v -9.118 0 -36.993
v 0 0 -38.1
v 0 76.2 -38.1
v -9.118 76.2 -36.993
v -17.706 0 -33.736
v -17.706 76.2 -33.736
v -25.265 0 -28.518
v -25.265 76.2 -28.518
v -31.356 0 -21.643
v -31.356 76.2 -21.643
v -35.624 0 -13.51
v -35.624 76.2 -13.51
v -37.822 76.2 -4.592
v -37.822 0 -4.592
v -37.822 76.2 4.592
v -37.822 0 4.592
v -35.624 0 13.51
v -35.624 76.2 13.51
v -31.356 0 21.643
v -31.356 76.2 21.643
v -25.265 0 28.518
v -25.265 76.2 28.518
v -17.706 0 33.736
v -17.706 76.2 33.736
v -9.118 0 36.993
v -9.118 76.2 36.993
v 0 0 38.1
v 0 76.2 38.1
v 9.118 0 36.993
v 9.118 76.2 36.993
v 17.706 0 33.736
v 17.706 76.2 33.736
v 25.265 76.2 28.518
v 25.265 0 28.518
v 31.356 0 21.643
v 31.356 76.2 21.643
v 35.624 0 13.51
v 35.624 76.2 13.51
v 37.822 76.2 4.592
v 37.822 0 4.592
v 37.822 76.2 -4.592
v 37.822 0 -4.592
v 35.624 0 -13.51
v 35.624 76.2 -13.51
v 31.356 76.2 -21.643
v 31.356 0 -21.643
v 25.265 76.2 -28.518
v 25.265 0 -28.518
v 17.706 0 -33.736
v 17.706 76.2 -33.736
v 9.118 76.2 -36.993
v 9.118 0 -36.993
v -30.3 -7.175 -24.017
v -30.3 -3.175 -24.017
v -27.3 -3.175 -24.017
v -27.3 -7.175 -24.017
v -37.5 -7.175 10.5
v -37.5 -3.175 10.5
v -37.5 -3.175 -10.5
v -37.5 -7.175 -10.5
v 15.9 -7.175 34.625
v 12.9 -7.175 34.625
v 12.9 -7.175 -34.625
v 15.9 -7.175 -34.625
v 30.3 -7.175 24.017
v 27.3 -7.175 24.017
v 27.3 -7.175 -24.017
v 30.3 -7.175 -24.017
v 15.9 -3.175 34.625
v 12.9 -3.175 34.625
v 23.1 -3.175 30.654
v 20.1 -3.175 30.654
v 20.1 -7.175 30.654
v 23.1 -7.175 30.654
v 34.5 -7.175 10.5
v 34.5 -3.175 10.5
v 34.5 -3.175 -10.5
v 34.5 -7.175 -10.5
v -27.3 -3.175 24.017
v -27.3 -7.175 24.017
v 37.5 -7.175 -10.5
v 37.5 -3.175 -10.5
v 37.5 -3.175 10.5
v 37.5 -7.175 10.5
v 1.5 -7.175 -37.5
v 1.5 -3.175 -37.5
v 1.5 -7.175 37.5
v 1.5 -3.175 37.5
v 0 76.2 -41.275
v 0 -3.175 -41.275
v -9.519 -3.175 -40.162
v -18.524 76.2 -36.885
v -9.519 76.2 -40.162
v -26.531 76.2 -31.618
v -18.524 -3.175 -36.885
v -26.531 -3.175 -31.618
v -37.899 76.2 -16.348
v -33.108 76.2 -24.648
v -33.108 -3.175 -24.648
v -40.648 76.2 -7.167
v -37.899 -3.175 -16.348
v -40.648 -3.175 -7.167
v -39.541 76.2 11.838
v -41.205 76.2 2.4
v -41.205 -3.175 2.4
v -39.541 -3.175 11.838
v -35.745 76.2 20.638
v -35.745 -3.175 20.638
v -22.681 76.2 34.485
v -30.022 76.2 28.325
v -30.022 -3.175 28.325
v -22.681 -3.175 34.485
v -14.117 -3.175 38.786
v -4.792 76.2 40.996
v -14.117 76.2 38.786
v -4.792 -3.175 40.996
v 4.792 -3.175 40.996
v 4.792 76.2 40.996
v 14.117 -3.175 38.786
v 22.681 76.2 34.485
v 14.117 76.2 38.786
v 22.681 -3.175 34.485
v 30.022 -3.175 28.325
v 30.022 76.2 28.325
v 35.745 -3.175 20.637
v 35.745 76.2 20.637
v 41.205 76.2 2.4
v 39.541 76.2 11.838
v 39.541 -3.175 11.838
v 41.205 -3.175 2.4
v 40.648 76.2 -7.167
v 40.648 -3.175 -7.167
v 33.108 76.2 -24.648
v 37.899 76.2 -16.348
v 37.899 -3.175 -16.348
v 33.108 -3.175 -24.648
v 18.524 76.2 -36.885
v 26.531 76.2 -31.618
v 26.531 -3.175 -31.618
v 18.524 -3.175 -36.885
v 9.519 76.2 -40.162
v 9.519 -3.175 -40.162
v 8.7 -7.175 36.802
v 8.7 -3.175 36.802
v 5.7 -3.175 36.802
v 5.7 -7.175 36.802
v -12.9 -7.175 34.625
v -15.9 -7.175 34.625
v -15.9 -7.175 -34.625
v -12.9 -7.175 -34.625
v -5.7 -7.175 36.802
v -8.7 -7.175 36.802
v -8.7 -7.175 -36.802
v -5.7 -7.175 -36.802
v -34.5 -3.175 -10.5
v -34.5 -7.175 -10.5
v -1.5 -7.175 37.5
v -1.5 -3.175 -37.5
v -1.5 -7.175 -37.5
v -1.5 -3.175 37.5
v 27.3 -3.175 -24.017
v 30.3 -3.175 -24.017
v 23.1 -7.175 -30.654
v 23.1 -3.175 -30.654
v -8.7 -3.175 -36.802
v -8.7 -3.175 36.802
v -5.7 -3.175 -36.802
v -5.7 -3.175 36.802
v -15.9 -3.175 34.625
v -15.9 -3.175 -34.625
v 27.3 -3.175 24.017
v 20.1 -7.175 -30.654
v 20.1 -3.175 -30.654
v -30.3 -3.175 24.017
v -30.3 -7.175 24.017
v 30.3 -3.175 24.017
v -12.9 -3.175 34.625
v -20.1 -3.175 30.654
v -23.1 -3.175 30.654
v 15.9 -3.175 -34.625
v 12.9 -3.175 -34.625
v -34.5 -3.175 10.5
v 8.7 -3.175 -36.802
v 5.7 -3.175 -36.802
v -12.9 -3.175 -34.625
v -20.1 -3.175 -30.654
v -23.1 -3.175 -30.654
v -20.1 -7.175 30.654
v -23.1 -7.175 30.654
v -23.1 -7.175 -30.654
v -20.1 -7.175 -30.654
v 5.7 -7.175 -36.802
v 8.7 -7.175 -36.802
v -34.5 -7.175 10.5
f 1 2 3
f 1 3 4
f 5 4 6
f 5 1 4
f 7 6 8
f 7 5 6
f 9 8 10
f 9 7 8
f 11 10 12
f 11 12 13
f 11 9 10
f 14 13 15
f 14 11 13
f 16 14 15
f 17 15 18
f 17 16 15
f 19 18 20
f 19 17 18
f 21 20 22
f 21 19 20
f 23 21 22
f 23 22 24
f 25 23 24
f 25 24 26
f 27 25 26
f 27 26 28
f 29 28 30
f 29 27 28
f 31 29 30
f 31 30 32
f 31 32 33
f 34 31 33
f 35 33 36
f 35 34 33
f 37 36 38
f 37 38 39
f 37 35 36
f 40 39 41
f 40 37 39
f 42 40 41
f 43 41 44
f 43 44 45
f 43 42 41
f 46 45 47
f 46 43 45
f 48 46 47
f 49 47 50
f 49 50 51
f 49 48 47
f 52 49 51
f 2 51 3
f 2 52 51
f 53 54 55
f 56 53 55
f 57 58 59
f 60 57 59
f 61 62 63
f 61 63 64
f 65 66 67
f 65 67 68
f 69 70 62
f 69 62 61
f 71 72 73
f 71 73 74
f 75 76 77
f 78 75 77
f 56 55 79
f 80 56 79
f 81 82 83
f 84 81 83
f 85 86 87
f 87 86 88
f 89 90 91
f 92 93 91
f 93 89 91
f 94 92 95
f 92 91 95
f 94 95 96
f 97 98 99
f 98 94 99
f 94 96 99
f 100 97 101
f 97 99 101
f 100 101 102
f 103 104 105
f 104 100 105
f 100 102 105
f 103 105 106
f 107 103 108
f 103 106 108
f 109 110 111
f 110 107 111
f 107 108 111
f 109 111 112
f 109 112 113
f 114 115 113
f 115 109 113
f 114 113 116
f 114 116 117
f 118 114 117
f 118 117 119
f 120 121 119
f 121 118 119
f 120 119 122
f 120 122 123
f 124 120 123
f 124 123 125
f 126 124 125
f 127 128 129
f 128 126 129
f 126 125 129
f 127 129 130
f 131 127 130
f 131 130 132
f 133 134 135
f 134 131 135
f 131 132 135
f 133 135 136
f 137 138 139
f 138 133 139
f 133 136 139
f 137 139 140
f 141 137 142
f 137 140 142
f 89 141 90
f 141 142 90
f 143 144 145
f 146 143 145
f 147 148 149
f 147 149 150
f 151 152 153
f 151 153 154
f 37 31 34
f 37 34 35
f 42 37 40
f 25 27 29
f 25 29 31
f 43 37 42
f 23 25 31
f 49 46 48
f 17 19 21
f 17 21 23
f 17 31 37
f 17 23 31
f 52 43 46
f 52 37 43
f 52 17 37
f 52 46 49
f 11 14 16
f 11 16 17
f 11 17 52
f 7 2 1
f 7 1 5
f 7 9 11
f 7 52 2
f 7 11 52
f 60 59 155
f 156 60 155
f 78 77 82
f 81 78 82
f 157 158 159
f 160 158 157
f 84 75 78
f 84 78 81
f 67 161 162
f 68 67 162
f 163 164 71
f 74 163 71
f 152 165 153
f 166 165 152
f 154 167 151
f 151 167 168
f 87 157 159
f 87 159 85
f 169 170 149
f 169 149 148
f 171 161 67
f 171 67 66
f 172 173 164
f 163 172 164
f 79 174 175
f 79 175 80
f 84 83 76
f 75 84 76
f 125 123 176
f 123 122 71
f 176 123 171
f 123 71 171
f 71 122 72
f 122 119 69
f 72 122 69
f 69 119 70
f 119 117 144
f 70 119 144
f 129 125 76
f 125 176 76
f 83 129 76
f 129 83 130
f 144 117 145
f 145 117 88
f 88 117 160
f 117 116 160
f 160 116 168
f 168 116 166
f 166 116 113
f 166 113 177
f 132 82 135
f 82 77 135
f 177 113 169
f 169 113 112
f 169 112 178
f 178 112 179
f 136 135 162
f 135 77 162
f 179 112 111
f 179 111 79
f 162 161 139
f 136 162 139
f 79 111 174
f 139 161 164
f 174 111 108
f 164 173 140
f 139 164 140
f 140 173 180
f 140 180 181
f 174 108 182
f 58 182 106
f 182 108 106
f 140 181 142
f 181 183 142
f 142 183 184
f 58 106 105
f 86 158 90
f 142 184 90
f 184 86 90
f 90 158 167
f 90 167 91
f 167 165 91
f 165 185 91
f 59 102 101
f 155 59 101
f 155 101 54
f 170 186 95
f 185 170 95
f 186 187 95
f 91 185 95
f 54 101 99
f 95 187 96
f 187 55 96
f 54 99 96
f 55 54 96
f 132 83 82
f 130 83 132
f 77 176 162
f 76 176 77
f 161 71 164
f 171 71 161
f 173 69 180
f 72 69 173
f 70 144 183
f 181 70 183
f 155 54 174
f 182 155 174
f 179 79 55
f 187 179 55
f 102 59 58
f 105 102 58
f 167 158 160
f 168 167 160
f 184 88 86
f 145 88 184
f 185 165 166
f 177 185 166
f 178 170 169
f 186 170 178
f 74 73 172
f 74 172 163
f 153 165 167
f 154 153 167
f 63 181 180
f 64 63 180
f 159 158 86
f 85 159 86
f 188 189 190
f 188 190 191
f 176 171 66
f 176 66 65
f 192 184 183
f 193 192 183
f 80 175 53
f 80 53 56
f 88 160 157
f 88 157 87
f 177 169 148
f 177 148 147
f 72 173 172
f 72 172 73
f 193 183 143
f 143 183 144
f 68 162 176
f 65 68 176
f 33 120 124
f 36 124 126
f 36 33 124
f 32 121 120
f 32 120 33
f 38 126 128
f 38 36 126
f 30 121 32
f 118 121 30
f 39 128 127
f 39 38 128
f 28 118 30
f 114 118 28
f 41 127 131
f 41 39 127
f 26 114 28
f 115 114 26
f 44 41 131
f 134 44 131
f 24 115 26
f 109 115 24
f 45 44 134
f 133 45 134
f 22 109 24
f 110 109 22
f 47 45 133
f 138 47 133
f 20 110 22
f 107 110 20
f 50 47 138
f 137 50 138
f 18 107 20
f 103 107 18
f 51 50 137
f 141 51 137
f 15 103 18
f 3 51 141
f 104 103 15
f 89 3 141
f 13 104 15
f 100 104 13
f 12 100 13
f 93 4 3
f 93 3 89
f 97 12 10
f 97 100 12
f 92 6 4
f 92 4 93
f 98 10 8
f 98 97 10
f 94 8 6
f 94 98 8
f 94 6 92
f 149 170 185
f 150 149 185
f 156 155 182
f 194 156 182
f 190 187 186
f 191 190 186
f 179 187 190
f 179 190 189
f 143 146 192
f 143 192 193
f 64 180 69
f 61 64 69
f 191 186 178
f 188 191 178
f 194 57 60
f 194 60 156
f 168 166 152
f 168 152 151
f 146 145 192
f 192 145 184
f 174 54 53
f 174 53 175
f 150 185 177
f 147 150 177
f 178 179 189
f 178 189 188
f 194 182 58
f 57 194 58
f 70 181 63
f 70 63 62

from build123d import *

# Parameters (mm, degrees)
SKETCH1_R           = 38.1
BOSS_EXTRUDE1_DEPTH = 76.2
SHELL2_T            = 3.175
SKETCH2_W           = 3
SKETCH2_H           = 75
SKETCH2_H_2         = 48.033738144
SKETCH2_H_3         = 61.308726948
SKETCH2_H_4         = 69.24998195
SKETCH2_H_5         = 73.60461942
BOSS_EXTRUDE2_DEPTH = 4


with BuildPart() as part:
    # Sketch1 → Boss-Extrude1 (new body)
    with BuildSketch(Plane(origin=(0, 0, 0), x_dir=(1, 0, 0), z_dir=(0, 1, 0))):
        with Locations(Location((0, 0, 0), (0, 0, 90))):
            Circle(SKETCH1_R)
    extrude(amount=BOSS_EXTRUDE1_DEPTH)

    # Shell2
    shell2_openings = [part.faces().sort_by_distance(p)[0] for p in [
        (0, 76.2, 0),
    ]]
    offset(amount=SHELL2_T, openings=shell2_openings, kind=Kind.INTERSECTION)

    # Sketch2 → Boss-Extrude2 (add)
    with BuildSketch(Plane.XZ.offset(3.175)):
        Rectangle(SKETCH2_W, SKETCH2_H)
        Polygon((-34.5, -10.5), (-34.5, 0), (-34.5, 10.5), (-37.5, 10.5), (-37.5, -10.5), align=None)
        with Locations((-28.8, 0)):
            Rectangle(SKETCH2_W, SKETCH2_H_2)
        with Locations((-21.6, 0)):
            Rectangle(SKETCH2_W, SKETCH2_H_3)
        with Locations((-14.4, 0)):
            Rectangle(SKETCH2_W, SKETCH2_H_4)
        with Locations((-7.2, 0)):
            Rectangle(SKETCH2_W, SKETCH2_H_5)
        Polygon((8.7, -36.80230971), (8.7, 0), (8.7, 36.80230971), (5.7, 36.80230971), (5.7, -36.80230971), align=None)
        with Locations((14.4, 0)):
            Rectangle(SKETCH2_W, SKETCH2_H_4)
        with Locations((21.6, 0)):
            Rectangle(SKETCH2_W, SKETCH2_H_3)
        with Locations((28.8, 0)):
            Rectangle(SKETCH2_W, SKETCH2_H_2)
        Polygon((37.5, -10.5), (37.5, 10.5), (34.5, 10.5), (34.5, 0), (34.5, -10.5), align=None)
    extrude(amount=BOSS_EXTRUDE2_DEPTH)


solid = part.part
